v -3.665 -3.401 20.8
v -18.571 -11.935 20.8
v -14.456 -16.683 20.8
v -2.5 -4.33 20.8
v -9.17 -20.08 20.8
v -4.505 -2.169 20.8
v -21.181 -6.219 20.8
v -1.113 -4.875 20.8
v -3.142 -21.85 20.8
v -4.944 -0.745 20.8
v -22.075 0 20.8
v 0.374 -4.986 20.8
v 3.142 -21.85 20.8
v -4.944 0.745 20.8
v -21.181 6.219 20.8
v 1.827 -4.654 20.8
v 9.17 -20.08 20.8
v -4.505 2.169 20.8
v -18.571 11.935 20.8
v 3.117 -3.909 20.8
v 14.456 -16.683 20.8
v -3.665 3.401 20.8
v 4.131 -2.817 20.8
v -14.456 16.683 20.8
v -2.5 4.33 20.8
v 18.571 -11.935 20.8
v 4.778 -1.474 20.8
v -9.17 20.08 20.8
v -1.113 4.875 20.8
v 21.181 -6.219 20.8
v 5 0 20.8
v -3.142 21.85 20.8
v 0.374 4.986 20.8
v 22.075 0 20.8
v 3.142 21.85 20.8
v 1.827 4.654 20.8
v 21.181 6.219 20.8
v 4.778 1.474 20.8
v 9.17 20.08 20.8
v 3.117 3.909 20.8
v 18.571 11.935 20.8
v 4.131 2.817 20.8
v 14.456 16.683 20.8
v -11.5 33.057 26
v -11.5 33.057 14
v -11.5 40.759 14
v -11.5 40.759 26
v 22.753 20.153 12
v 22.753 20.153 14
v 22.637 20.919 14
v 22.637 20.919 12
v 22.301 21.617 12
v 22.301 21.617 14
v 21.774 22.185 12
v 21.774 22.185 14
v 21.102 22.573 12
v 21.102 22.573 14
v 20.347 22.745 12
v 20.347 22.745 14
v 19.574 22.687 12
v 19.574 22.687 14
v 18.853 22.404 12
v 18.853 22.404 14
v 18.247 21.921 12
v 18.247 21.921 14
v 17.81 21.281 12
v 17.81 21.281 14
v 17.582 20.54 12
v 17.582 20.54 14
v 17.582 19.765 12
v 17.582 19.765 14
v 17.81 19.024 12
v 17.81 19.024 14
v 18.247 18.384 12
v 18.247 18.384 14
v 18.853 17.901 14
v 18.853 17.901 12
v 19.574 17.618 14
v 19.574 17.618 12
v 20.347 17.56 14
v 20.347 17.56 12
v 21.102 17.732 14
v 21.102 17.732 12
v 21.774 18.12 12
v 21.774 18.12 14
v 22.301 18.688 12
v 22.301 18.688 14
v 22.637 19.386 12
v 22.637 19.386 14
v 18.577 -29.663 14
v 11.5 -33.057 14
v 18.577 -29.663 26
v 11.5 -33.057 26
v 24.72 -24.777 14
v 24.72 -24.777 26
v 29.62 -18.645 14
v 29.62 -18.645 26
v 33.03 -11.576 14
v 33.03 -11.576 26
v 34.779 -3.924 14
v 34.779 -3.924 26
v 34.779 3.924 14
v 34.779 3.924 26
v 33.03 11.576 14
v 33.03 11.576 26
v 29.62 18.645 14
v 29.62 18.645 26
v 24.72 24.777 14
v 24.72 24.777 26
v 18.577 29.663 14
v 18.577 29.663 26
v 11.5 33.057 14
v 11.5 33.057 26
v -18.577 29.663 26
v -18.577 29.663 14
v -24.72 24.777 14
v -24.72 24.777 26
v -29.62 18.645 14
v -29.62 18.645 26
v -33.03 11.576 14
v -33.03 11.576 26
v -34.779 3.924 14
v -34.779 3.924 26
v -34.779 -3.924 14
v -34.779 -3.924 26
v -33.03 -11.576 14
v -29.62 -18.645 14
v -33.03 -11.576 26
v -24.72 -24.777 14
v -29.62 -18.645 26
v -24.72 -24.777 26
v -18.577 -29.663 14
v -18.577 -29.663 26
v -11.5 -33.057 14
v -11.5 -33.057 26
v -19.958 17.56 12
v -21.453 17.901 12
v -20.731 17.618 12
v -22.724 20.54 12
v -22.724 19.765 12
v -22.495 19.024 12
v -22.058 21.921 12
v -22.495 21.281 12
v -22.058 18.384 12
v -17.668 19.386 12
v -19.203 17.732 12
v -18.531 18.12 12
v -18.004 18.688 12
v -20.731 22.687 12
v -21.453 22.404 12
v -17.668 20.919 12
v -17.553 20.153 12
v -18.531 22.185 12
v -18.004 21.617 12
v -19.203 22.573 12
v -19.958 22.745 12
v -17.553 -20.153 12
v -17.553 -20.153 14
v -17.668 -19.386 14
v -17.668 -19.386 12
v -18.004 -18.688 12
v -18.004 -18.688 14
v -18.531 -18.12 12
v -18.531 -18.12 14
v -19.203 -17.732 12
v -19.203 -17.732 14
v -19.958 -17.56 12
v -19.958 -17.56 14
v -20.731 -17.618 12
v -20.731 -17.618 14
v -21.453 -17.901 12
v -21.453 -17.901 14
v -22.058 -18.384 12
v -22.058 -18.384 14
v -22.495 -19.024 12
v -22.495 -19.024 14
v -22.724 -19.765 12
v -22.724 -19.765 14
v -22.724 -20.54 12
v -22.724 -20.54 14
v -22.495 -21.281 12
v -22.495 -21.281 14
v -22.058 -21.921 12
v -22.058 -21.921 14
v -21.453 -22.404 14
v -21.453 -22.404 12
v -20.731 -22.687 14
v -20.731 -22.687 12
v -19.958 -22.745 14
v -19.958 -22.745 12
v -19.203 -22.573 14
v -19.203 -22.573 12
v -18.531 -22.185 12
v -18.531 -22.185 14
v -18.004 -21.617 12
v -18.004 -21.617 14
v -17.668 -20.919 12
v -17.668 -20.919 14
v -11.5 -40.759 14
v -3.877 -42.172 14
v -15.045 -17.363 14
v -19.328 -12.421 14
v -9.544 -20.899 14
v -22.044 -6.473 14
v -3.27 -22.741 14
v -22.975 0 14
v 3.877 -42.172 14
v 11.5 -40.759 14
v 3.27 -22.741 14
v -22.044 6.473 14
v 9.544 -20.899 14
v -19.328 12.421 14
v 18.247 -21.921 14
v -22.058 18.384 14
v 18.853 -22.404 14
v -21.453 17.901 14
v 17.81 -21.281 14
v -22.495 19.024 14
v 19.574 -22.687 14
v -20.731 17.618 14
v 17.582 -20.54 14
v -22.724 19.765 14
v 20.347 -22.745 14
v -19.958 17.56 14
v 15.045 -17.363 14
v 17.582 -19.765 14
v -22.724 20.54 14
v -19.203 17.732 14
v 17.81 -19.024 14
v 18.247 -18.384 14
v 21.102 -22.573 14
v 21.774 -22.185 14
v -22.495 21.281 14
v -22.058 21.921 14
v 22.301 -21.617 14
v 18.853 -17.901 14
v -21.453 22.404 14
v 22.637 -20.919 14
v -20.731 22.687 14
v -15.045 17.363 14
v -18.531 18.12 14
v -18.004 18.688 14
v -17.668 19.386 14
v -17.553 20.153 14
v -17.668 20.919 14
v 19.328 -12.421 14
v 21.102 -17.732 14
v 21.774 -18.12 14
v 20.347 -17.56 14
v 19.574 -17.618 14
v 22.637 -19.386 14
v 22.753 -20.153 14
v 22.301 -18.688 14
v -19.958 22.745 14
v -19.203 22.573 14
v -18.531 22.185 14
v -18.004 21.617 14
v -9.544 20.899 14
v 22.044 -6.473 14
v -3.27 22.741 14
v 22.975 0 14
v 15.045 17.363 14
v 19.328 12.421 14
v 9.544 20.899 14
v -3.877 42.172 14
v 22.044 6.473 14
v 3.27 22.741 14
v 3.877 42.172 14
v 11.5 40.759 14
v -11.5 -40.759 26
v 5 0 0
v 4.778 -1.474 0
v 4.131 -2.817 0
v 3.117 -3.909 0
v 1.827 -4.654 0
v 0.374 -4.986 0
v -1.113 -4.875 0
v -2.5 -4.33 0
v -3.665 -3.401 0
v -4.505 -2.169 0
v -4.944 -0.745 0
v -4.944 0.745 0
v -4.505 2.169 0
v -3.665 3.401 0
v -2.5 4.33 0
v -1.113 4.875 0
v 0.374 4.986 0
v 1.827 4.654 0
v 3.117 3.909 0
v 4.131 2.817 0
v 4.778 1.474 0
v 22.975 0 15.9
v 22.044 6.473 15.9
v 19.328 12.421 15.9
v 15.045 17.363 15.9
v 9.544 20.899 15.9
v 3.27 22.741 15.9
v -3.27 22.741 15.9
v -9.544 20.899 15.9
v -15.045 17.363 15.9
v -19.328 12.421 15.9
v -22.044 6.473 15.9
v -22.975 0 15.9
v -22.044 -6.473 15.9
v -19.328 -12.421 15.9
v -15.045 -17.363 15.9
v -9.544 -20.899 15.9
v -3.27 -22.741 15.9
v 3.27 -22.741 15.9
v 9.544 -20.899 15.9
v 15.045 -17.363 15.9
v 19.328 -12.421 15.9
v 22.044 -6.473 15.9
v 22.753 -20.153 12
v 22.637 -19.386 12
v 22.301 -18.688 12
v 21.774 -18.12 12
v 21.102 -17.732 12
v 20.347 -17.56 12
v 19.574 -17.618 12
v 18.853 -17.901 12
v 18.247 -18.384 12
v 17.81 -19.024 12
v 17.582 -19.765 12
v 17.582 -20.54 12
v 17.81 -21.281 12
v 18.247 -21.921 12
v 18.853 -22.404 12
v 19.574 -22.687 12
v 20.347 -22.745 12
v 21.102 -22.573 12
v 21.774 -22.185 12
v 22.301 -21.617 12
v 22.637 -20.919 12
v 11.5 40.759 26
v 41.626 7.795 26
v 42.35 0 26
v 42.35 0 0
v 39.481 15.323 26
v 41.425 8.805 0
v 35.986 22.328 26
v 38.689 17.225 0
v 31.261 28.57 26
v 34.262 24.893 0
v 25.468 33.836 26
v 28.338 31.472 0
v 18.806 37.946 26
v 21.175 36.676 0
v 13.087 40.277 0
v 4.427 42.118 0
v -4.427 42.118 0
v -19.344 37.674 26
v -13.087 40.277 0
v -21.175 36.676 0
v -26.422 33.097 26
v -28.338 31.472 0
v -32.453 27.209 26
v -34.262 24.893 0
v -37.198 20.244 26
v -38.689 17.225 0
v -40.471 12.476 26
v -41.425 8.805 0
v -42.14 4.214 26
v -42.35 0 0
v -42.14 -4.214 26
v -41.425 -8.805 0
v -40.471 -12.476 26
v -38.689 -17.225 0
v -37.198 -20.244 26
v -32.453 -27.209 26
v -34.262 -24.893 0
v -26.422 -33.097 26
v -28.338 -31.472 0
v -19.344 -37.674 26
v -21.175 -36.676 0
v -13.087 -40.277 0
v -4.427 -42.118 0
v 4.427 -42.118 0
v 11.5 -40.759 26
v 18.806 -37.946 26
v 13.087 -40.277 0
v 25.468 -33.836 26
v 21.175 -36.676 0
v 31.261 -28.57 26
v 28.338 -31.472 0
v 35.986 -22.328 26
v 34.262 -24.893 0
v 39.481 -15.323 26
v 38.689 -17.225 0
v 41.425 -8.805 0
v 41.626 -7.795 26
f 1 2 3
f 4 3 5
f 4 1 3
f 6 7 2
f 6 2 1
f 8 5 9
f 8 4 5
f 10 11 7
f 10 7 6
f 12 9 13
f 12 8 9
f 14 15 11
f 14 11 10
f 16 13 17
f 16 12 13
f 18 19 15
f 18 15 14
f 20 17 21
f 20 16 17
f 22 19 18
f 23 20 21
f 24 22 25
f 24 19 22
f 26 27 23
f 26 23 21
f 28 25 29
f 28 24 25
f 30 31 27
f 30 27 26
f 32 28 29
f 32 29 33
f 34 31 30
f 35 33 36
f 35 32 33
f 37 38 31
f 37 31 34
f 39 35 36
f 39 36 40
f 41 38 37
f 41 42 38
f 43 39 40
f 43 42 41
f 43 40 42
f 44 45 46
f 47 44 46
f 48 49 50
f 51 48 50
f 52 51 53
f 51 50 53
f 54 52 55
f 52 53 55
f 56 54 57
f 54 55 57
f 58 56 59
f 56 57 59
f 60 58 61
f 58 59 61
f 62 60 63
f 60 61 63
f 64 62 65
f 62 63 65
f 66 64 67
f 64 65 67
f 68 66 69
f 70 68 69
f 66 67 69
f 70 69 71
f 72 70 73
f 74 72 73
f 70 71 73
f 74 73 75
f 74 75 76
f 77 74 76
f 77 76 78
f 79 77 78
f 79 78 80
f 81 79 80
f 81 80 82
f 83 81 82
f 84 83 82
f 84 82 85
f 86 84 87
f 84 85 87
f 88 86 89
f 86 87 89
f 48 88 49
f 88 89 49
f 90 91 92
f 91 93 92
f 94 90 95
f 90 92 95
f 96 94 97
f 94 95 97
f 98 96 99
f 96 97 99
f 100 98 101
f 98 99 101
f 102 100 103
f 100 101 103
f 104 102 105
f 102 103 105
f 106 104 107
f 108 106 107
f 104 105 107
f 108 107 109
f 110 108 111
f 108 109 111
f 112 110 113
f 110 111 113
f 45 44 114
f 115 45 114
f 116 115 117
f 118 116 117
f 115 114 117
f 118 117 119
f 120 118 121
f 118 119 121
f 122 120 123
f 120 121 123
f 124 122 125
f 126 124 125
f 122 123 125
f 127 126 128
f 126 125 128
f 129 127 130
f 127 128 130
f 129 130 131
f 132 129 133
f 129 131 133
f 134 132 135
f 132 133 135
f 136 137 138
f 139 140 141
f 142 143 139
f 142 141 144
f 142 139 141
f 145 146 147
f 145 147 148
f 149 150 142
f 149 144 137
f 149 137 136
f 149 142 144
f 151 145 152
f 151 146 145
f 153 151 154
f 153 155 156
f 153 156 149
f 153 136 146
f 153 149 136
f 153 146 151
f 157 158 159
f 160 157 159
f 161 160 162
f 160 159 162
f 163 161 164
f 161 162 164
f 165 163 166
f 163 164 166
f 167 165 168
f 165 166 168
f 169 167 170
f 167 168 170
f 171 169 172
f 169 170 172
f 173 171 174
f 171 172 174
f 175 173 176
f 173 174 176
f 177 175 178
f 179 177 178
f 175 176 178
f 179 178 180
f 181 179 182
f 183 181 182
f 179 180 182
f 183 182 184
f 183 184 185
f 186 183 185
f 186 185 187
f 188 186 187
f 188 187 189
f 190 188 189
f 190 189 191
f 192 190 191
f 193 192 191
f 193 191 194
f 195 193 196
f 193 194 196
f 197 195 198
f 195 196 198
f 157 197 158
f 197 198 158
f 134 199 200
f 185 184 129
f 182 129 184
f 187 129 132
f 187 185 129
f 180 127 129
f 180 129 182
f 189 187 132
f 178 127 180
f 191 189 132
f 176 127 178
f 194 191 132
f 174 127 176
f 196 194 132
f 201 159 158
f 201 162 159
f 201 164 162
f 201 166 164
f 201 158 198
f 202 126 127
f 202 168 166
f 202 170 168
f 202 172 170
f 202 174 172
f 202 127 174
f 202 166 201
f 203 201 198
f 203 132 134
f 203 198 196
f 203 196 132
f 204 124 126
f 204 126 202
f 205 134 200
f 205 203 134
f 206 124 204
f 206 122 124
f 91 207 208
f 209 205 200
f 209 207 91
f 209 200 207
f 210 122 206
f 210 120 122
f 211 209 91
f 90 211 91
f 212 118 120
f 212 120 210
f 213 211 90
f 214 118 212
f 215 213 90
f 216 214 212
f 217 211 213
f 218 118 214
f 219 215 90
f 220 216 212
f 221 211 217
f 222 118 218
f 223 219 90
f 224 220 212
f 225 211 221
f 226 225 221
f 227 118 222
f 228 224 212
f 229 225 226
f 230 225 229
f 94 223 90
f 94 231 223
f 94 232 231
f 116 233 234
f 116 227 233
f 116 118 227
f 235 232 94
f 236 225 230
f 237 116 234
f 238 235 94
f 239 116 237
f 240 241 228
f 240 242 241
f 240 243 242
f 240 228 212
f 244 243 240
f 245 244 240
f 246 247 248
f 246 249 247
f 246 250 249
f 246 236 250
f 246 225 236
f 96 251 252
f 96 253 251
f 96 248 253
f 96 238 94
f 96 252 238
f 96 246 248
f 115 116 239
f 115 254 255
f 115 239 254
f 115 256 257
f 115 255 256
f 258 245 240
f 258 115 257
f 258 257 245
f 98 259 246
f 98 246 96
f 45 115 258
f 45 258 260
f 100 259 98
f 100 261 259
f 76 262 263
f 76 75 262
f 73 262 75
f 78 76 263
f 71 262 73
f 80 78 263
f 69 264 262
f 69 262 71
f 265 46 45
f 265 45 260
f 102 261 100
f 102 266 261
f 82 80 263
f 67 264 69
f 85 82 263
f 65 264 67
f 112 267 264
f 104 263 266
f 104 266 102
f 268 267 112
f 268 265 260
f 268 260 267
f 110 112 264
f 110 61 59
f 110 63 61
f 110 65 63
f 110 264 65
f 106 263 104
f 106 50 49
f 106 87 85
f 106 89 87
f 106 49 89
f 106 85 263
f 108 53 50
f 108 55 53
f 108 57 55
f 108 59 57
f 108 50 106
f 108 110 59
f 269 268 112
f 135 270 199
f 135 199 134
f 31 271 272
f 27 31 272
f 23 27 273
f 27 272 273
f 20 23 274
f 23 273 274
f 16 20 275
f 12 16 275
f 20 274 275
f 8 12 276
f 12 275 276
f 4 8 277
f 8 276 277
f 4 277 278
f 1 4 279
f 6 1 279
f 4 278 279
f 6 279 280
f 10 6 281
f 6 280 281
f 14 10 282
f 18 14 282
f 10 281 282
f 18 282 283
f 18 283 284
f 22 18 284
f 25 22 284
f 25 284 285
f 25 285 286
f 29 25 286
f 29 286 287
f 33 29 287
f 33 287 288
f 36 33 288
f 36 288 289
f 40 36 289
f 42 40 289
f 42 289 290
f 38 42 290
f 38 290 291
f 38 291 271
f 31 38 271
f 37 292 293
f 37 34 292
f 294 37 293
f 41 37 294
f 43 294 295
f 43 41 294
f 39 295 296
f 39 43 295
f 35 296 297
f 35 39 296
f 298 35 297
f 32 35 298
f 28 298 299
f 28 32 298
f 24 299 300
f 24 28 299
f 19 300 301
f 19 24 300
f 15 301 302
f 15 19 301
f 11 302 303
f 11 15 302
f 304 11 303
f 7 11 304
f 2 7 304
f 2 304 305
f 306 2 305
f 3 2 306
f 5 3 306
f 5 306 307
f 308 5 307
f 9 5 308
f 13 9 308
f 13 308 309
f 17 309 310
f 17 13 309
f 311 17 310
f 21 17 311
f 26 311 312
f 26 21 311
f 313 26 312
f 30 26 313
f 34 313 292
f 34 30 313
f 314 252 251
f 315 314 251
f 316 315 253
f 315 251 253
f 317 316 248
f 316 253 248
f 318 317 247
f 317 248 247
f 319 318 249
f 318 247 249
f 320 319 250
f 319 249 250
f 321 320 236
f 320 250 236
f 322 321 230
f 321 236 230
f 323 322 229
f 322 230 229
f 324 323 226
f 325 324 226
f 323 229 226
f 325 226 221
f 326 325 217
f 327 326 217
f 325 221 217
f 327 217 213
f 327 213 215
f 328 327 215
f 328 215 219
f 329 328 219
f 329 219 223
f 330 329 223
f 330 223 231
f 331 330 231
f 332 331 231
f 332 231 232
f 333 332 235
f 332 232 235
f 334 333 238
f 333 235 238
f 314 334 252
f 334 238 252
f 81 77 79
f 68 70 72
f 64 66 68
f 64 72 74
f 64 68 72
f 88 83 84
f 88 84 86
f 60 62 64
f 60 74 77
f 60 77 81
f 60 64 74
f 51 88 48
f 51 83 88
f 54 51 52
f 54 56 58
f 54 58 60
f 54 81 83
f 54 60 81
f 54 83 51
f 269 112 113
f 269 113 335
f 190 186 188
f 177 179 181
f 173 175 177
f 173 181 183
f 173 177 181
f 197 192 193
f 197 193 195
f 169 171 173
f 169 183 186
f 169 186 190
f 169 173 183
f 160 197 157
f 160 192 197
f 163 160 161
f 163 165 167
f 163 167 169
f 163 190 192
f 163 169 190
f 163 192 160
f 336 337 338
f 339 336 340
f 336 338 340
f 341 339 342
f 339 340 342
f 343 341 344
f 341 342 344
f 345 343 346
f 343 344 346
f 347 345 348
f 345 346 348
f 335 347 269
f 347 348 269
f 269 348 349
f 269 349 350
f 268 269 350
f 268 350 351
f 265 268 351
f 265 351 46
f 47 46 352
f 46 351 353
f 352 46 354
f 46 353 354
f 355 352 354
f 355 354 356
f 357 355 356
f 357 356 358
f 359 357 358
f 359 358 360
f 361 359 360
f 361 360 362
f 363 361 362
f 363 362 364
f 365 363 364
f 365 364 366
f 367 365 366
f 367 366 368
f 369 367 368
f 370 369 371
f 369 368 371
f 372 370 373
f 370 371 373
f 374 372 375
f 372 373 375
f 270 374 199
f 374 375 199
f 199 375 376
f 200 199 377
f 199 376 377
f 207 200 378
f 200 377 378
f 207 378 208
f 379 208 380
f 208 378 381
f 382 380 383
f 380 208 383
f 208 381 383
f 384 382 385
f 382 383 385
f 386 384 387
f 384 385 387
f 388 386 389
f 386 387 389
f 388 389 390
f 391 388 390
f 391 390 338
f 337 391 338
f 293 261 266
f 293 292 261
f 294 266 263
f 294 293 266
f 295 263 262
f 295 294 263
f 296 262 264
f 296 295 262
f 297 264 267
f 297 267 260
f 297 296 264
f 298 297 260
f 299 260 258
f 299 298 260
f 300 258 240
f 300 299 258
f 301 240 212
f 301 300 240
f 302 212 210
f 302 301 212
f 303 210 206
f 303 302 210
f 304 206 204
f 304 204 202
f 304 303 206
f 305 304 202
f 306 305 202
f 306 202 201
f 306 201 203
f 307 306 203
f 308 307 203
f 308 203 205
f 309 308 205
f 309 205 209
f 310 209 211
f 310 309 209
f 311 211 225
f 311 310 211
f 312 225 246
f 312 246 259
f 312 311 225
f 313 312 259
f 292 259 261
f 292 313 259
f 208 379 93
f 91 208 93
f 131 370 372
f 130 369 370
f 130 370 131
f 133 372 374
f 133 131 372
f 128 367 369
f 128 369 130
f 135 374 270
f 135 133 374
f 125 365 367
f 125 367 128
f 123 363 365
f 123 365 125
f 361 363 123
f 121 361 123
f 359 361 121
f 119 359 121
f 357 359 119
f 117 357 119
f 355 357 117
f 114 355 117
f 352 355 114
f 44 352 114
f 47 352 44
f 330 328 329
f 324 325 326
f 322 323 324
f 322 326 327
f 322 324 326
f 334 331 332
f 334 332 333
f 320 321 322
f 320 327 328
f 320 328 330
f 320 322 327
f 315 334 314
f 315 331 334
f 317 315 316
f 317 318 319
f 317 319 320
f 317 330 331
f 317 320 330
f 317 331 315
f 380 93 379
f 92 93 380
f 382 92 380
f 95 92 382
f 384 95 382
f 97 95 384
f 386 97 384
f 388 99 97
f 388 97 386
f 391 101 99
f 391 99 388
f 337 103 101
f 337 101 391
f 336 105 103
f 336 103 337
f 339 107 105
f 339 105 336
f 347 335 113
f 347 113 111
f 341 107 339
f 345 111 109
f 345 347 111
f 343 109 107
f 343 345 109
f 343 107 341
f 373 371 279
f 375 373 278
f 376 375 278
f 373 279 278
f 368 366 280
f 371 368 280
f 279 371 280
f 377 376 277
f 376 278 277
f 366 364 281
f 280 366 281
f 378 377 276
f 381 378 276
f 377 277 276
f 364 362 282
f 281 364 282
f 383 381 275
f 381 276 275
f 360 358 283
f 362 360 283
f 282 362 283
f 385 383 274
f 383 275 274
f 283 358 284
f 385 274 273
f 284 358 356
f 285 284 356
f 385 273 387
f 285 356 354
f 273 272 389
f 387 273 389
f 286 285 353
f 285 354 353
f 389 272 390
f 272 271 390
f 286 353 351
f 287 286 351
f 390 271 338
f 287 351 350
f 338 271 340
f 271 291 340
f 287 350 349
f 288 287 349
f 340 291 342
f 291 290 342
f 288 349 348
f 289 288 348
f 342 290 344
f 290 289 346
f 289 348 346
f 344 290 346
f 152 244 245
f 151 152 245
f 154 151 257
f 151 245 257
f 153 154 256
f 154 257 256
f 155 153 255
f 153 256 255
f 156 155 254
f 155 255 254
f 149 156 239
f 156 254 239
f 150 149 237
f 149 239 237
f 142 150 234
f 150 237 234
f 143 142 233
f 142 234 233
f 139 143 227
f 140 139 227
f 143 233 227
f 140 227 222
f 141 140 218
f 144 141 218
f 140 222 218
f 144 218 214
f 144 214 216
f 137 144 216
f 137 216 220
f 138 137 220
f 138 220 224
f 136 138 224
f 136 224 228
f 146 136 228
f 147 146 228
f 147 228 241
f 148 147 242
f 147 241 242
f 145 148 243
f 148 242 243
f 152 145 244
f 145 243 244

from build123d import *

# Parameters (mm, degrees)
F0_R      = 42.35
F1_DEPTH  = 26
F2_R      = 35
F3_DEPTH  = 12
F6_W      = 23
F6_H      = 100
F7_DEPTH  = 12
F8_R      = 2.6
F9_DEPTH  = 2
F12_R     = 5
F13_DEPTH = 26.001


with BuildPart() as f1:
    # F0 (on Top) → F1 (new body)
    with BuildSketch(Plane.XY):
        Circle(F0_R)
    extrude(amount=F1_DEPTH)

    # F2 (on face) → F3 (cut)
    with BuildSketch(Plane.XY.offset(26)):
        Circle(F2_R)
    extrude(amount=-F3_DEPTH, mode=Mode.SUBTRACT)

    # F6 (on face) → F7 (cut)
    with BuildSketch(Plane.XY.offset(26)):
        Rectangle(F6_W, F6_H)
    extrude(amount=-F7_DEPTH, mode=Mode.SUBTRACT)

    # F8 (on face) → F9 (cut)
    with BuildSketch(Plane.XY.offset(14)):
        with Locations((-20.152543, 20.152543)):
            Circle(F8_R)
        with Locations((20.152543, 20.152543)):
            Circle(F8_R)
        with Locations((20.152543, -20.152543)):
            Circle(F8_R)
        with Locations((-20.152543, -20.152543)):
            Circle(F8_R)
    extrude(amount=-F9_DEPTH, mode=Mode.SUBTRACT)

    # F10 (on Front) → F11 (revolve)
    with BuildSketch(Plane.XZ):
        Polygon((22.075, 20.8), (0, 20.8), (0, 14), (22.975, 14), (22.975, 15.9), align=None)
    revolve(axis=Axis((0, 0, 8.84423), (0, 0, 1)))

    # F12 (on face) → F13 (cut, through all)
    with BuildSketch(Plane(origin=(0, 0, 0), x_dir=(1, 0, 0), z_dir=(0, 0, -1))):
        Circle(F12_R)
    extrude(amount=-F13_DEPTH, mode=Mode.SUBTRACT)


solid = f1.part
